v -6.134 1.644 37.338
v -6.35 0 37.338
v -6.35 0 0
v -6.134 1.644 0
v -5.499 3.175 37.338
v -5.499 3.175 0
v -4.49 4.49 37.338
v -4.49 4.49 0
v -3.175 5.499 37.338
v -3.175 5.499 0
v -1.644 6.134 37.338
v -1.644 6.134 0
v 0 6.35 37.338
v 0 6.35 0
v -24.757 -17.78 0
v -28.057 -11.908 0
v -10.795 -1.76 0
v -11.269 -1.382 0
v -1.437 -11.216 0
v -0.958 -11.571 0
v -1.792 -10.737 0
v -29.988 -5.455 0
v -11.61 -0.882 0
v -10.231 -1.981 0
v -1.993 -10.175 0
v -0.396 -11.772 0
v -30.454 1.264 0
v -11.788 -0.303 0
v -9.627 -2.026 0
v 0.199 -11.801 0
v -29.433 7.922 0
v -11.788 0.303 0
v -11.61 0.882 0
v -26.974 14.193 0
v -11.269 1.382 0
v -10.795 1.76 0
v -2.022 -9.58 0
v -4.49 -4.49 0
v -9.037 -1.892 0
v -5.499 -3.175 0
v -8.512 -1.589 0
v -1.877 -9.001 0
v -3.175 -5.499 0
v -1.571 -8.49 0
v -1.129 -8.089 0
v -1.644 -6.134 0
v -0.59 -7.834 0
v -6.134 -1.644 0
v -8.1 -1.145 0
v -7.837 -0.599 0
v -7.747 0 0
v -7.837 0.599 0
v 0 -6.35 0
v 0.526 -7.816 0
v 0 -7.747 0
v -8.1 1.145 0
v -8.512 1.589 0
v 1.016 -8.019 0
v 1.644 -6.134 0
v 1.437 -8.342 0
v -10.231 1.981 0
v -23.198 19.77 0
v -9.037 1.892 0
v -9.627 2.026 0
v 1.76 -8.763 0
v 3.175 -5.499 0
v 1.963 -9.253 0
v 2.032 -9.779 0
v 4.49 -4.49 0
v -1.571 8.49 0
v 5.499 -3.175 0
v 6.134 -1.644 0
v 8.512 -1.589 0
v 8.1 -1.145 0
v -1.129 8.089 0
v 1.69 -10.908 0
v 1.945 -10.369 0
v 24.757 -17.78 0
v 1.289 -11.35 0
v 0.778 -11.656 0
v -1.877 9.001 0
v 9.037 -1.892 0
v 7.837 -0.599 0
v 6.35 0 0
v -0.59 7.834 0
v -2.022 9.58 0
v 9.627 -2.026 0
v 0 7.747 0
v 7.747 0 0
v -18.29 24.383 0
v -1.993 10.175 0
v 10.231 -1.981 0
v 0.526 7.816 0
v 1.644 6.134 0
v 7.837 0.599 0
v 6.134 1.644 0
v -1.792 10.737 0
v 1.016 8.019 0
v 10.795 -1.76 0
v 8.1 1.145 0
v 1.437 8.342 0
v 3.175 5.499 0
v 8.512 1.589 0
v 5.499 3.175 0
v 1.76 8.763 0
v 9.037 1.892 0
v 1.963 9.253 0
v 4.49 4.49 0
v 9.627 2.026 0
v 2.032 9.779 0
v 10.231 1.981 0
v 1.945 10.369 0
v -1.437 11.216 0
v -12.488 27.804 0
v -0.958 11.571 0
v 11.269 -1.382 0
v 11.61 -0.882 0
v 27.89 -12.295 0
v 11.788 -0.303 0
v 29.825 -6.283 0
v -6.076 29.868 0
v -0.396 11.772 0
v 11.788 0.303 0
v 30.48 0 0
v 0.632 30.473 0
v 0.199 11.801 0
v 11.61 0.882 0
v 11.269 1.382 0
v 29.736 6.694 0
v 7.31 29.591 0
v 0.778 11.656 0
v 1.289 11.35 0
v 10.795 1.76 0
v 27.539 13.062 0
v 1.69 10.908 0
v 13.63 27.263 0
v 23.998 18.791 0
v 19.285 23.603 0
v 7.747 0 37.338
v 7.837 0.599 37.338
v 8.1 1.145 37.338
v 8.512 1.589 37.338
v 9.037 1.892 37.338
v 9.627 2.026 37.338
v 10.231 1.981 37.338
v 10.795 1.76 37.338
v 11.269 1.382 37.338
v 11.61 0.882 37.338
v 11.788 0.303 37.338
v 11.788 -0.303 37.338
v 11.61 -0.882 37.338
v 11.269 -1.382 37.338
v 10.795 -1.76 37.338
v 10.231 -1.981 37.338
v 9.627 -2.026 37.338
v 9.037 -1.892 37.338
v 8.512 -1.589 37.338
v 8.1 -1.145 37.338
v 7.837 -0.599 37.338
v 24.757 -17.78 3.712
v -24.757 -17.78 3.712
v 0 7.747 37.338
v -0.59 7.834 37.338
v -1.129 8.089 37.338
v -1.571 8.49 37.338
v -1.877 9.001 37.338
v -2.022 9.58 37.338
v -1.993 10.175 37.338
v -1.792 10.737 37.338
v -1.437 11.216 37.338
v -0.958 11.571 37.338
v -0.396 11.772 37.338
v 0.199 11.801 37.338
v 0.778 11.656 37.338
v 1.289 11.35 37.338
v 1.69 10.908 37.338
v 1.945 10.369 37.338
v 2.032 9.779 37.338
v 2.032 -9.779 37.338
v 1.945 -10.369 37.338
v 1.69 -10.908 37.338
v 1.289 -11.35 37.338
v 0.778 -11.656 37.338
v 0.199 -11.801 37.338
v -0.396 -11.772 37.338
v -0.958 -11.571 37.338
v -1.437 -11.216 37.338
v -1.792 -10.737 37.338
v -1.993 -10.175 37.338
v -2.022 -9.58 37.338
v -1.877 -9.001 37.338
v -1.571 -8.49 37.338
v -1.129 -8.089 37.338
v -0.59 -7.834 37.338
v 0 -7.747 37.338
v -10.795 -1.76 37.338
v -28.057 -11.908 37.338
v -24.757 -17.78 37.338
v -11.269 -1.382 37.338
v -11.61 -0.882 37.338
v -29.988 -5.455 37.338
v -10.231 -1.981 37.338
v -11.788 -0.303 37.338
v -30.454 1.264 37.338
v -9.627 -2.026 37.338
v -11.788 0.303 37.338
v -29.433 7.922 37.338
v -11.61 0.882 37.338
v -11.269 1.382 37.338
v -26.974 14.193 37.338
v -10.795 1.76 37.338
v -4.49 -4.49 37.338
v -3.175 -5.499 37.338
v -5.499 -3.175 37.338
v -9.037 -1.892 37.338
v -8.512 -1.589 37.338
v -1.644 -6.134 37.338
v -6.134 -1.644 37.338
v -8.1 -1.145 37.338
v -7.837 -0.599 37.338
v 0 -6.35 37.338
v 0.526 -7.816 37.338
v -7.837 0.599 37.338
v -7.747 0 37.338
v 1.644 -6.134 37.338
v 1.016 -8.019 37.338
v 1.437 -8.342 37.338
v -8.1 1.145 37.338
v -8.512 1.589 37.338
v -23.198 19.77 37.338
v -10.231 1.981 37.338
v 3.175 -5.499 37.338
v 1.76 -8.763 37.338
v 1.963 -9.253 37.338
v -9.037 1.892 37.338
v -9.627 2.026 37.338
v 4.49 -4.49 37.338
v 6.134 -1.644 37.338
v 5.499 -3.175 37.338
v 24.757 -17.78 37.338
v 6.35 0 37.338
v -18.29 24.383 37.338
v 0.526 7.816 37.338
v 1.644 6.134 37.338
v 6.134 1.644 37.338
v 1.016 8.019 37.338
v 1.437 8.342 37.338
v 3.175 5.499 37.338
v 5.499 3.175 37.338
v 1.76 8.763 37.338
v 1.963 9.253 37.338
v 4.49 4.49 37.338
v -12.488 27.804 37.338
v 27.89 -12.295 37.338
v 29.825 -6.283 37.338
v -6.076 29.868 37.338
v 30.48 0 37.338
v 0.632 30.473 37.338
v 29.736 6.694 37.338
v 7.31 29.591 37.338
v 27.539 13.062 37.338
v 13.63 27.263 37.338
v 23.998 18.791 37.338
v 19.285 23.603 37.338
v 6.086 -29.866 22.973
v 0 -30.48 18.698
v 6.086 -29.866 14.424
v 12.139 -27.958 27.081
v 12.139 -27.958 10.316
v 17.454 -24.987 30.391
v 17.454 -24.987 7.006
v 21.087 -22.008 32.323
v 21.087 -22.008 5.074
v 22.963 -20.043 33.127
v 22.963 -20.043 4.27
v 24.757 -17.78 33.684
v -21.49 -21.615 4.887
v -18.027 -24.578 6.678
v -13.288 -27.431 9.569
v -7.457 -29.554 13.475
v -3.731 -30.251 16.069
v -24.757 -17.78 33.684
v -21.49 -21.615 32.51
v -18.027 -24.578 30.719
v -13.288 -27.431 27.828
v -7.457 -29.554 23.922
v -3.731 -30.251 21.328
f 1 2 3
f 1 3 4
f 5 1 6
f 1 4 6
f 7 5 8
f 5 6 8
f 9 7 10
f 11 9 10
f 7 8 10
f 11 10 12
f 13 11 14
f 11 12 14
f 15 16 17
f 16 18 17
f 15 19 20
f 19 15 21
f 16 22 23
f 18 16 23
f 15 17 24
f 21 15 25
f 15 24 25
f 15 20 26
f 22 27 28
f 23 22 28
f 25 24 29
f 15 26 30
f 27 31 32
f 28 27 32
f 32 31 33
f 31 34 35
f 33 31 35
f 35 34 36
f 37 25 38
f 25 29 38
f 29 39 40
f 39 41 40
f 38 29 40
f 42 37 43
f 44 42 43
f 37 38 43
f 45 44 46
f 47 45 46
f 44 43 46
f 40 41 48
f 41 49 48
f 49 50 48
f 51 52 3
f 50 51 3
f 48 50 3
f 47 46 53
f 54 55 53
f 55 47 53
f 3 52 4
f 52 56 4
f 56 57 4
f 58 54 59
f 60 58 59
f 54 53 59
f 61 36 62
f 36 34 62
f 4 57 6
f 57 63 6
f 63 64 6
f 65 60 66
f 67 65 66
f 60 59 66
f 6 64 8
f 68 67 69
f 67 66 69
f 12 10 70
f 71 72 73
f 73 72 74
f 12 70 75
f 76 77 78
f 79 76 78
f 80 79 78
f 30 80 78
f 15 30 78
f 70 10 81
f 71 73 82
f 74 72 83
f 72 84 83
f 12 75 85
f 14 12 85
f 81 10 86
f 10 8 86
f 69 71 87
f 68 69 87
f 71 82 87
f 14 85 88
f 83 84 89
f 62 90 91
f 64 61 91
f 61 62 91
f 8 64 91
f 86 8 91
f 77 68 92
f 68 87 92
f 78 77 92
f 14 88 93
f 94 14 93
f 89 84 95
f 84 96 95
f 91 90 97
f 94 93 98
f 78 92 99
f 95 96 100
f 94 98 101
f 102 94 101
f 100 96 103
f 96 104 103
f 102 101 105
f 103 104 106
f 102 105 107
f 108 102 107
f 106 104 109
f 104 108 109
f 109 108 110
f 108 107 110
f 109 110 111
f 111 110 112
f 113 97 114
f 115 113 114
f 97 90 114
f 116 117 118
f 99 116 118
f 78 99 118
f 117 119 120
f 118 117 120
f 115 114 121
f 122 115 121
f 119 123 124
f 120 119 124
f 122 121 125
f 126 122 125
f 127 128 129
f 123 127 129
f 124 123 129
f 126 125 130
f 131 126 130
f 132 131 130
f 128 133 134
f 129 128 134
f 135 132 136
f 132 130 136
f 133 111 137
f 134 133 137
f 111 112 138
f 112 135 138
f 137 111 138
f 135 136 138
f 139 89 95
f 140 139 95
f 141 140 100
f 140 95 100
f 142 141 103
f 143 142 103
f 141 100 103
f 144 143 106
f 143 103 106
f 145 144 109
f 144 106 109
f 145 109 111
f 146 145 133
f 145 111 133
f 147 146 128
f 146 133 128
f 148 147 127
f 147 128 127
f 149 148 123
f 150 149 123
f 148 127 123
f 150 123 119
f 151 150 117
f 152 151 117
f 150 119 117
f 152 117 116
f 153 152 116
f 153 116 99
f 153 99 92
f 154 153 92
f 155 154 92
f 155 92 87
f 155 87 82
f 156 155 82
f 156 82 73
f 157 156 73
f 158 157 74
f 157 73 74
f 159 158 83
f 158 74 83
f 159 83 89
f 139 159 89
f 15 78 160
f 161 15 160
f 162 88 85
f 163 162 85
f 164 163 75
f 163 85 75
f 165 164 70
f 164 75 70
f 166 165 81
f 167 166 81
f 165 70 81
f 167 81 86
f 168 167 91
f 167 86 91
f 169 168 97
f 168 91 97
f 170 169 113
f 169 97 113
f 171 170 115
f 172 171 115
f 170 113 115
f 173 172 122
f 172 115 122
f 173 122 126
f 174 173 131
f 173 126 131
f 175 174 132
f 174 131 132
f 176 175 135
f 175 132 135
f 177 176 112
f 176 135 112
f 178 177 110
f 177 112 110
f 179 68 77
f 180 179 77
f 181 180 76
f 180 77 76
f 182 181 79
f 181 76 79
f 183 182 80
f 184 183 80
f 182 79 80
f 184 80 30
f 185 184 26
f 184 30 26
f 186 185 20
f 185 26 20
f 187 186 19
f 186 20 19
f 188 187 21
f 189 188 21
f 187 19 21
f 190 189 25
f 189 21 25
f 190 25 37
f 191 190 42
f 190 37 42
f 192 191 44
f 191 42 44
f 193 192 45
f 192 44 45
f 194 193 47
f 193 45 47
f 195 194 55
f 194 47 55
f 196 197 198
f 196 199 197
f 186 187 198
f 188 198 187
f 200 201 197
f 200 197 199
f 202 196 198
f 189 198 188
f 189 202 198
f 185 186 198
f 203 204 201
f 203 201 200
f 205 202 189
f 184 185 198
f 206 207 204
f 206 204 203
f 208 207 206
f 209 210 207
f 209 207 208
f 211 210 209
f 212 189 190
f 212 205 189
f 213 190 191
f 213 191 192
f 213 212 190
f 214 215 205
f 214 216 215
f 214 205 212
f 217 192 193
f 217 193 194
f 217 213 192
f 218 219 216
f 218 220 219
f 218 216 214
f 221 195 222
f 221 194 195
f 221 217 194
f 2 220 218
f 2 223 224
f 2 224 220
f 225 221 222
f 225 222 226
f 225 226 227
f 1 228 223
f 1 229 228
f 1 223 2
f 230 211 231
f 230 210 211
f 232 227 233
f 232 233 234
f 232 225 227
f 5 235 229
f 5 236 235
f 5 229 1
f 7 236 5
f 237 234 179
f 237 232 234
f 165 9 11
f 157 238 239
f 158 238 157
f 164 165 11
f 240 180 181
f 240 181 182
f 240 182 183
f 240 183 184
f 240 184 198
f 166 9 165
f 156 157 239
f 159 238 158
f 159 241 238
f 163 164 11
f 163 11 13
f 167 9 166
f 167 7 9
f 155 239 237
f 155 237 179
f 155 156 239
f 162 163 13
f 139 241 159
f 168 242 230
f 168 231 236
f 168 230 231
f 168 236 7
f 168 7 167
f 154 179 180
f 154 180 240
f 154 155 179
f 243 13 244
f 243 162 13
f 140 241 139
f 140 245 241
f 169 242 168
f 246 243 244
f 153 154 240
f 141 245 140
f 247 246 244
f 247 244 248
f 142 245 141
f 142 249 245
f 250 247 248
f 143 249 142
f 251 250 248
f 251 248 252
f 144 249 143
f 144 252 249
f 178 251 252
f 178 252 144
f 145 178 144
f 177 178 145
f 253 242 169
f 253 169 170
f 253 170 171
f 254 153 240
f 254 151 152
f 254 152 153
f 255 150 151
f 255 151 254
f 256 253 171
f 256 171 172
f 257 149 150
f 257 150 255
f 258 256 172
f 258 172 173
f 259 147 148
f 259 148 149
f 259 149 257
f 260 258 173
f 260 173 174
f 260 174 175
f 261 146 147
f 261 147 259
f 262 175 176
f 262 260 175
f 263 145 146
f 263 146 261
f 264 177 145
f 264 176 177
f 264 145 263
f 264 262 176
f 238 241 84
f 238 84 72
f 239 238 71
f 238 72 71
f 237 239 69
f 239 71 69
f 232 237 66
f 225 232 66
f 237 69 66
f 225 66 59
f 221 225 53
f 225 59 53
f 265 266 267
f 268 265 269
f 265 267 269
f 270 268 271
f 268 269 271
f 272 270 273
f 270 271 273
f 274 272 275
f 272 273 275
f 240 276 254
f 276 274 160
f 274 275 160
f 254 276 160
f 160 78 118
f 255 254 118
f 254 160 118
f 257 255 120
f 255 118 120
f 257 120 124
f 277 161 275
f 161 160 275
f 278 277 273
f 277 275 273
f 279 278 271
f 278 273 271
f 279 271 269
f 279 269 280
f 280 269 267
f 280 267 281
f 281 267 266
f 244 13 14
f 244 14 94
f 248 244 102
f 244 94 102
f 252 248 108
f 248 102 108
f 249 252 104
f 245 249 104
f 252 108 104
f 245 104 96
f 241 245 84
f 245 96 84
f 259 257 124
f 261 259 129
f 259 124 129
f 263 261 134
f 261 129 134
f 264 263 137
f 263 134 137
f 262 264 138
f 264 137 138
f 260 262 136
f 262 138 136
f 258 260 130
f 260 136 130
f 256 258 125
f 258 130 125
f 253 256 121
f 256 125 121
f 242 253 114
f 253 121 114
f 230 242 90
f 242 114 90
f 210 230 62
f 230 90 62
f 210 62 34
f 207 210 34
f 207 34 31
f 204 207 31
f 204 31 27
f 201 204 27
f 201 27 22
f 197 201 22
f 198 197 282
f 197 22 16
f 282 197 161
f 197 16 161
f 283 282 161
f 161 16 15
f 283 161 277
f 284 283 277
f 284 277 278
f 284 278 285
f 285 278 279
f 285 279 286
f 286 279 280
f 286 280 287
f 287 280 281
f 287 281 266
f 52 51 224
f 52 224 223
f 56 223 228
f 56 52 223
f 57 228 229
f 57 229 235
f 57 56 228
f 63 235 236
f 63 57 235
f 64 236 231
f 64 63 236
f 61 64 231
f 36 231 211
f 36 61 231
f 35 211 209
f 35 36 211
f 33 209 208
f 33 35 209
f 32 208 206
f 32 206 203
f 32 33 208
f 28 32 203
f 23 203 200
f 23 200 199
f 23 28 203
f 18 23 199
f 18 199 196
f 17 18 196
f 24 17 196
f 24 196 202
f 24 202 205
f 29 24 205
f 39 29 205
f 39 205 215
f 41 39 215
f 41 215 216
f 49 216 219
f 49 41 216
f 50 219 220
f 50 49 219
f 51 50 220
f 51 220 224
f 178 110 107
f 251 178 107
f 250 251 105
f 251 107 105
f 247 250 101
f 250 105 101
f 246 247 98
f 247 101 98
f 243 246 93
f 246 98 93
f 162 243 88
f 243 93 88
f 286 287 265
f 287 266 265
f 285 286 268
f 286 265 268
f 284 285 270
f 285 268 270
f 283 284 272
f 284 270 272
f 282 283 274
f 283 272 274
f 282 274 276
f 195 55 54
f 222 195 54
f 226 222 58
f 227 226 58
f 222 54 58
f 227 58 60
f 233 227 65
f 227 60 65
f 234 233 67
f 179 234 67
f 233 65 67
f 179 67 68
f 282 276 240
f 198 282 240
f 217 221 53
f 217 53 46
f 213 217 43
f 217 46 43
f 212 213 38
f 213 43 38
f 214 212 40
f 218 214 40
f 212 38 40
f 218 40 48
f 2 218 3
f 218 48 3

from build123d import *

# Parameters (mm, degrees)
F0_R     = 30.48
F0_R_2   = 2.032
F1_DEPTH = 37.338
F3_DEPTH = 39.58267
F4_DEPTH = 55.88364


with BuildPart() as f1:
    # F0 (on Top) → F1 (new body)
    with BuildSketch(Plane.XY):
        Circle(F0_R)
        with BuildLine():
            ThreePointArc((2.032, -9.779), (-1.4368409794, -11.2158409794), (0, -7.747))
            ThreePointArc((0, -7.747), (1.4368409794, -8.3421590206), (2.032, -9.779))
        make_face(mode=Mode.SUBTRACT)
        with Locations((-9.779, 0)):
            Circle(F0_R_2, mode=Mode.SUBTRACT)
        with BuildLine():
            ThreePointArc((0, 6.35), (4.4901280605, 4.4901280605), (6.35, 0))
            ThreePointArc((6.35, 0), (4.4901280605, -4.4901280605), (0, -6.35))
            ThreePointArc((0, -6.35), (-4.4901280605, -4.4901280605), (-6.35, 0))
            ThreePointArc((-6.35, 0), (-4.4901280605, 4.4901280605), (0, 6.35))
        make_face(mode=Mode.SUBTRACT)
        with BuildLine():
            ThreePointArc((11.811, 0), (9.779, -2.032), (7.747, 0))
            ThreePointArc((7.747, 0), (9.779, 2.032), (11.811, 0))
        make_face(mode=Mode.SUBTRACT)
        with BuildLine():
            ThreePointArc((2.032, 9.779), (1.4368409794, 8.3421590206), (0, 7.747))
            ThreePointArc((0, 7.747), (-1.4368409794, 11.2158409794), (2.032, 9.779))
        make_face(mode=Mode.SUBTRACT)
    extrude(amount=F1_DEPTH)

    # F2 (on Right) → F3 (cut)
    with BuildSketch(Plane.YZ):
        with BuildLine():
            Line((-30.48, 37.3969972134), (-30.48, 18.6984986067))
            ThreePointArc((-30.48, 18.6984986067), (-26.8779716111, 28.5202881076), (-17.78, 33.6844986067))
            Line((-17.78, 33.6844986067), (-17.78, 37.3969972134))
            Line((-17.78, 37.3969972134), (-30.48, 37.3969972134))
        make_face()
        with BuildLine():
            Line((-30.48, 0), (-17.78, 0))
            Line((-17.78, 0), (-17.78, 3.7124986067))
            ThreePointArc((-17.78, 3.7124986067), (-26.8779716111, 8.8767091058), (-30.48, 18.6984986067))
            Line((-30.48, 18.6984986067), (-30.48, 0))
        make_face()
    extrude(amount=-F3_DEPTH, mode=Mode.SUBTRACT)

    # F2 (on Right) → F4 (cut)
    with BuildSketch(Plane.YZ):
        with BuildLine():
            Line((-30.48, 37.3969972134), (-30.48, 18.6984986067))
            ThreePointArc((-30.48, 18.6984986067), (-26.8779716111, 28.5202881076), (-17.78, 33.6844986067))
            Line((-17.78, 33.6844986067), (-17.78, 37.3969972134))
            Line((-17.78, 37.3969972134), (-30.48, 37.3969972134))
        make_face()
        with BuildLine():
            Line((-30.48, 0), (-17.78, 0))
            Line((-17.78, 0), (-17.78, 3.7124986067))
            ThreePointArc((-17.78, 3.7124986067), (-26.8779716111, 8.8767091058), (-30.48, 18.6984986067))
            Line((-30.48, 18.6984986067), (-30.48, 0))
        make_face()
    extrude(amount=F4_DEPTH, mode=Mode.SUBTRACT)


solid = f1.part
